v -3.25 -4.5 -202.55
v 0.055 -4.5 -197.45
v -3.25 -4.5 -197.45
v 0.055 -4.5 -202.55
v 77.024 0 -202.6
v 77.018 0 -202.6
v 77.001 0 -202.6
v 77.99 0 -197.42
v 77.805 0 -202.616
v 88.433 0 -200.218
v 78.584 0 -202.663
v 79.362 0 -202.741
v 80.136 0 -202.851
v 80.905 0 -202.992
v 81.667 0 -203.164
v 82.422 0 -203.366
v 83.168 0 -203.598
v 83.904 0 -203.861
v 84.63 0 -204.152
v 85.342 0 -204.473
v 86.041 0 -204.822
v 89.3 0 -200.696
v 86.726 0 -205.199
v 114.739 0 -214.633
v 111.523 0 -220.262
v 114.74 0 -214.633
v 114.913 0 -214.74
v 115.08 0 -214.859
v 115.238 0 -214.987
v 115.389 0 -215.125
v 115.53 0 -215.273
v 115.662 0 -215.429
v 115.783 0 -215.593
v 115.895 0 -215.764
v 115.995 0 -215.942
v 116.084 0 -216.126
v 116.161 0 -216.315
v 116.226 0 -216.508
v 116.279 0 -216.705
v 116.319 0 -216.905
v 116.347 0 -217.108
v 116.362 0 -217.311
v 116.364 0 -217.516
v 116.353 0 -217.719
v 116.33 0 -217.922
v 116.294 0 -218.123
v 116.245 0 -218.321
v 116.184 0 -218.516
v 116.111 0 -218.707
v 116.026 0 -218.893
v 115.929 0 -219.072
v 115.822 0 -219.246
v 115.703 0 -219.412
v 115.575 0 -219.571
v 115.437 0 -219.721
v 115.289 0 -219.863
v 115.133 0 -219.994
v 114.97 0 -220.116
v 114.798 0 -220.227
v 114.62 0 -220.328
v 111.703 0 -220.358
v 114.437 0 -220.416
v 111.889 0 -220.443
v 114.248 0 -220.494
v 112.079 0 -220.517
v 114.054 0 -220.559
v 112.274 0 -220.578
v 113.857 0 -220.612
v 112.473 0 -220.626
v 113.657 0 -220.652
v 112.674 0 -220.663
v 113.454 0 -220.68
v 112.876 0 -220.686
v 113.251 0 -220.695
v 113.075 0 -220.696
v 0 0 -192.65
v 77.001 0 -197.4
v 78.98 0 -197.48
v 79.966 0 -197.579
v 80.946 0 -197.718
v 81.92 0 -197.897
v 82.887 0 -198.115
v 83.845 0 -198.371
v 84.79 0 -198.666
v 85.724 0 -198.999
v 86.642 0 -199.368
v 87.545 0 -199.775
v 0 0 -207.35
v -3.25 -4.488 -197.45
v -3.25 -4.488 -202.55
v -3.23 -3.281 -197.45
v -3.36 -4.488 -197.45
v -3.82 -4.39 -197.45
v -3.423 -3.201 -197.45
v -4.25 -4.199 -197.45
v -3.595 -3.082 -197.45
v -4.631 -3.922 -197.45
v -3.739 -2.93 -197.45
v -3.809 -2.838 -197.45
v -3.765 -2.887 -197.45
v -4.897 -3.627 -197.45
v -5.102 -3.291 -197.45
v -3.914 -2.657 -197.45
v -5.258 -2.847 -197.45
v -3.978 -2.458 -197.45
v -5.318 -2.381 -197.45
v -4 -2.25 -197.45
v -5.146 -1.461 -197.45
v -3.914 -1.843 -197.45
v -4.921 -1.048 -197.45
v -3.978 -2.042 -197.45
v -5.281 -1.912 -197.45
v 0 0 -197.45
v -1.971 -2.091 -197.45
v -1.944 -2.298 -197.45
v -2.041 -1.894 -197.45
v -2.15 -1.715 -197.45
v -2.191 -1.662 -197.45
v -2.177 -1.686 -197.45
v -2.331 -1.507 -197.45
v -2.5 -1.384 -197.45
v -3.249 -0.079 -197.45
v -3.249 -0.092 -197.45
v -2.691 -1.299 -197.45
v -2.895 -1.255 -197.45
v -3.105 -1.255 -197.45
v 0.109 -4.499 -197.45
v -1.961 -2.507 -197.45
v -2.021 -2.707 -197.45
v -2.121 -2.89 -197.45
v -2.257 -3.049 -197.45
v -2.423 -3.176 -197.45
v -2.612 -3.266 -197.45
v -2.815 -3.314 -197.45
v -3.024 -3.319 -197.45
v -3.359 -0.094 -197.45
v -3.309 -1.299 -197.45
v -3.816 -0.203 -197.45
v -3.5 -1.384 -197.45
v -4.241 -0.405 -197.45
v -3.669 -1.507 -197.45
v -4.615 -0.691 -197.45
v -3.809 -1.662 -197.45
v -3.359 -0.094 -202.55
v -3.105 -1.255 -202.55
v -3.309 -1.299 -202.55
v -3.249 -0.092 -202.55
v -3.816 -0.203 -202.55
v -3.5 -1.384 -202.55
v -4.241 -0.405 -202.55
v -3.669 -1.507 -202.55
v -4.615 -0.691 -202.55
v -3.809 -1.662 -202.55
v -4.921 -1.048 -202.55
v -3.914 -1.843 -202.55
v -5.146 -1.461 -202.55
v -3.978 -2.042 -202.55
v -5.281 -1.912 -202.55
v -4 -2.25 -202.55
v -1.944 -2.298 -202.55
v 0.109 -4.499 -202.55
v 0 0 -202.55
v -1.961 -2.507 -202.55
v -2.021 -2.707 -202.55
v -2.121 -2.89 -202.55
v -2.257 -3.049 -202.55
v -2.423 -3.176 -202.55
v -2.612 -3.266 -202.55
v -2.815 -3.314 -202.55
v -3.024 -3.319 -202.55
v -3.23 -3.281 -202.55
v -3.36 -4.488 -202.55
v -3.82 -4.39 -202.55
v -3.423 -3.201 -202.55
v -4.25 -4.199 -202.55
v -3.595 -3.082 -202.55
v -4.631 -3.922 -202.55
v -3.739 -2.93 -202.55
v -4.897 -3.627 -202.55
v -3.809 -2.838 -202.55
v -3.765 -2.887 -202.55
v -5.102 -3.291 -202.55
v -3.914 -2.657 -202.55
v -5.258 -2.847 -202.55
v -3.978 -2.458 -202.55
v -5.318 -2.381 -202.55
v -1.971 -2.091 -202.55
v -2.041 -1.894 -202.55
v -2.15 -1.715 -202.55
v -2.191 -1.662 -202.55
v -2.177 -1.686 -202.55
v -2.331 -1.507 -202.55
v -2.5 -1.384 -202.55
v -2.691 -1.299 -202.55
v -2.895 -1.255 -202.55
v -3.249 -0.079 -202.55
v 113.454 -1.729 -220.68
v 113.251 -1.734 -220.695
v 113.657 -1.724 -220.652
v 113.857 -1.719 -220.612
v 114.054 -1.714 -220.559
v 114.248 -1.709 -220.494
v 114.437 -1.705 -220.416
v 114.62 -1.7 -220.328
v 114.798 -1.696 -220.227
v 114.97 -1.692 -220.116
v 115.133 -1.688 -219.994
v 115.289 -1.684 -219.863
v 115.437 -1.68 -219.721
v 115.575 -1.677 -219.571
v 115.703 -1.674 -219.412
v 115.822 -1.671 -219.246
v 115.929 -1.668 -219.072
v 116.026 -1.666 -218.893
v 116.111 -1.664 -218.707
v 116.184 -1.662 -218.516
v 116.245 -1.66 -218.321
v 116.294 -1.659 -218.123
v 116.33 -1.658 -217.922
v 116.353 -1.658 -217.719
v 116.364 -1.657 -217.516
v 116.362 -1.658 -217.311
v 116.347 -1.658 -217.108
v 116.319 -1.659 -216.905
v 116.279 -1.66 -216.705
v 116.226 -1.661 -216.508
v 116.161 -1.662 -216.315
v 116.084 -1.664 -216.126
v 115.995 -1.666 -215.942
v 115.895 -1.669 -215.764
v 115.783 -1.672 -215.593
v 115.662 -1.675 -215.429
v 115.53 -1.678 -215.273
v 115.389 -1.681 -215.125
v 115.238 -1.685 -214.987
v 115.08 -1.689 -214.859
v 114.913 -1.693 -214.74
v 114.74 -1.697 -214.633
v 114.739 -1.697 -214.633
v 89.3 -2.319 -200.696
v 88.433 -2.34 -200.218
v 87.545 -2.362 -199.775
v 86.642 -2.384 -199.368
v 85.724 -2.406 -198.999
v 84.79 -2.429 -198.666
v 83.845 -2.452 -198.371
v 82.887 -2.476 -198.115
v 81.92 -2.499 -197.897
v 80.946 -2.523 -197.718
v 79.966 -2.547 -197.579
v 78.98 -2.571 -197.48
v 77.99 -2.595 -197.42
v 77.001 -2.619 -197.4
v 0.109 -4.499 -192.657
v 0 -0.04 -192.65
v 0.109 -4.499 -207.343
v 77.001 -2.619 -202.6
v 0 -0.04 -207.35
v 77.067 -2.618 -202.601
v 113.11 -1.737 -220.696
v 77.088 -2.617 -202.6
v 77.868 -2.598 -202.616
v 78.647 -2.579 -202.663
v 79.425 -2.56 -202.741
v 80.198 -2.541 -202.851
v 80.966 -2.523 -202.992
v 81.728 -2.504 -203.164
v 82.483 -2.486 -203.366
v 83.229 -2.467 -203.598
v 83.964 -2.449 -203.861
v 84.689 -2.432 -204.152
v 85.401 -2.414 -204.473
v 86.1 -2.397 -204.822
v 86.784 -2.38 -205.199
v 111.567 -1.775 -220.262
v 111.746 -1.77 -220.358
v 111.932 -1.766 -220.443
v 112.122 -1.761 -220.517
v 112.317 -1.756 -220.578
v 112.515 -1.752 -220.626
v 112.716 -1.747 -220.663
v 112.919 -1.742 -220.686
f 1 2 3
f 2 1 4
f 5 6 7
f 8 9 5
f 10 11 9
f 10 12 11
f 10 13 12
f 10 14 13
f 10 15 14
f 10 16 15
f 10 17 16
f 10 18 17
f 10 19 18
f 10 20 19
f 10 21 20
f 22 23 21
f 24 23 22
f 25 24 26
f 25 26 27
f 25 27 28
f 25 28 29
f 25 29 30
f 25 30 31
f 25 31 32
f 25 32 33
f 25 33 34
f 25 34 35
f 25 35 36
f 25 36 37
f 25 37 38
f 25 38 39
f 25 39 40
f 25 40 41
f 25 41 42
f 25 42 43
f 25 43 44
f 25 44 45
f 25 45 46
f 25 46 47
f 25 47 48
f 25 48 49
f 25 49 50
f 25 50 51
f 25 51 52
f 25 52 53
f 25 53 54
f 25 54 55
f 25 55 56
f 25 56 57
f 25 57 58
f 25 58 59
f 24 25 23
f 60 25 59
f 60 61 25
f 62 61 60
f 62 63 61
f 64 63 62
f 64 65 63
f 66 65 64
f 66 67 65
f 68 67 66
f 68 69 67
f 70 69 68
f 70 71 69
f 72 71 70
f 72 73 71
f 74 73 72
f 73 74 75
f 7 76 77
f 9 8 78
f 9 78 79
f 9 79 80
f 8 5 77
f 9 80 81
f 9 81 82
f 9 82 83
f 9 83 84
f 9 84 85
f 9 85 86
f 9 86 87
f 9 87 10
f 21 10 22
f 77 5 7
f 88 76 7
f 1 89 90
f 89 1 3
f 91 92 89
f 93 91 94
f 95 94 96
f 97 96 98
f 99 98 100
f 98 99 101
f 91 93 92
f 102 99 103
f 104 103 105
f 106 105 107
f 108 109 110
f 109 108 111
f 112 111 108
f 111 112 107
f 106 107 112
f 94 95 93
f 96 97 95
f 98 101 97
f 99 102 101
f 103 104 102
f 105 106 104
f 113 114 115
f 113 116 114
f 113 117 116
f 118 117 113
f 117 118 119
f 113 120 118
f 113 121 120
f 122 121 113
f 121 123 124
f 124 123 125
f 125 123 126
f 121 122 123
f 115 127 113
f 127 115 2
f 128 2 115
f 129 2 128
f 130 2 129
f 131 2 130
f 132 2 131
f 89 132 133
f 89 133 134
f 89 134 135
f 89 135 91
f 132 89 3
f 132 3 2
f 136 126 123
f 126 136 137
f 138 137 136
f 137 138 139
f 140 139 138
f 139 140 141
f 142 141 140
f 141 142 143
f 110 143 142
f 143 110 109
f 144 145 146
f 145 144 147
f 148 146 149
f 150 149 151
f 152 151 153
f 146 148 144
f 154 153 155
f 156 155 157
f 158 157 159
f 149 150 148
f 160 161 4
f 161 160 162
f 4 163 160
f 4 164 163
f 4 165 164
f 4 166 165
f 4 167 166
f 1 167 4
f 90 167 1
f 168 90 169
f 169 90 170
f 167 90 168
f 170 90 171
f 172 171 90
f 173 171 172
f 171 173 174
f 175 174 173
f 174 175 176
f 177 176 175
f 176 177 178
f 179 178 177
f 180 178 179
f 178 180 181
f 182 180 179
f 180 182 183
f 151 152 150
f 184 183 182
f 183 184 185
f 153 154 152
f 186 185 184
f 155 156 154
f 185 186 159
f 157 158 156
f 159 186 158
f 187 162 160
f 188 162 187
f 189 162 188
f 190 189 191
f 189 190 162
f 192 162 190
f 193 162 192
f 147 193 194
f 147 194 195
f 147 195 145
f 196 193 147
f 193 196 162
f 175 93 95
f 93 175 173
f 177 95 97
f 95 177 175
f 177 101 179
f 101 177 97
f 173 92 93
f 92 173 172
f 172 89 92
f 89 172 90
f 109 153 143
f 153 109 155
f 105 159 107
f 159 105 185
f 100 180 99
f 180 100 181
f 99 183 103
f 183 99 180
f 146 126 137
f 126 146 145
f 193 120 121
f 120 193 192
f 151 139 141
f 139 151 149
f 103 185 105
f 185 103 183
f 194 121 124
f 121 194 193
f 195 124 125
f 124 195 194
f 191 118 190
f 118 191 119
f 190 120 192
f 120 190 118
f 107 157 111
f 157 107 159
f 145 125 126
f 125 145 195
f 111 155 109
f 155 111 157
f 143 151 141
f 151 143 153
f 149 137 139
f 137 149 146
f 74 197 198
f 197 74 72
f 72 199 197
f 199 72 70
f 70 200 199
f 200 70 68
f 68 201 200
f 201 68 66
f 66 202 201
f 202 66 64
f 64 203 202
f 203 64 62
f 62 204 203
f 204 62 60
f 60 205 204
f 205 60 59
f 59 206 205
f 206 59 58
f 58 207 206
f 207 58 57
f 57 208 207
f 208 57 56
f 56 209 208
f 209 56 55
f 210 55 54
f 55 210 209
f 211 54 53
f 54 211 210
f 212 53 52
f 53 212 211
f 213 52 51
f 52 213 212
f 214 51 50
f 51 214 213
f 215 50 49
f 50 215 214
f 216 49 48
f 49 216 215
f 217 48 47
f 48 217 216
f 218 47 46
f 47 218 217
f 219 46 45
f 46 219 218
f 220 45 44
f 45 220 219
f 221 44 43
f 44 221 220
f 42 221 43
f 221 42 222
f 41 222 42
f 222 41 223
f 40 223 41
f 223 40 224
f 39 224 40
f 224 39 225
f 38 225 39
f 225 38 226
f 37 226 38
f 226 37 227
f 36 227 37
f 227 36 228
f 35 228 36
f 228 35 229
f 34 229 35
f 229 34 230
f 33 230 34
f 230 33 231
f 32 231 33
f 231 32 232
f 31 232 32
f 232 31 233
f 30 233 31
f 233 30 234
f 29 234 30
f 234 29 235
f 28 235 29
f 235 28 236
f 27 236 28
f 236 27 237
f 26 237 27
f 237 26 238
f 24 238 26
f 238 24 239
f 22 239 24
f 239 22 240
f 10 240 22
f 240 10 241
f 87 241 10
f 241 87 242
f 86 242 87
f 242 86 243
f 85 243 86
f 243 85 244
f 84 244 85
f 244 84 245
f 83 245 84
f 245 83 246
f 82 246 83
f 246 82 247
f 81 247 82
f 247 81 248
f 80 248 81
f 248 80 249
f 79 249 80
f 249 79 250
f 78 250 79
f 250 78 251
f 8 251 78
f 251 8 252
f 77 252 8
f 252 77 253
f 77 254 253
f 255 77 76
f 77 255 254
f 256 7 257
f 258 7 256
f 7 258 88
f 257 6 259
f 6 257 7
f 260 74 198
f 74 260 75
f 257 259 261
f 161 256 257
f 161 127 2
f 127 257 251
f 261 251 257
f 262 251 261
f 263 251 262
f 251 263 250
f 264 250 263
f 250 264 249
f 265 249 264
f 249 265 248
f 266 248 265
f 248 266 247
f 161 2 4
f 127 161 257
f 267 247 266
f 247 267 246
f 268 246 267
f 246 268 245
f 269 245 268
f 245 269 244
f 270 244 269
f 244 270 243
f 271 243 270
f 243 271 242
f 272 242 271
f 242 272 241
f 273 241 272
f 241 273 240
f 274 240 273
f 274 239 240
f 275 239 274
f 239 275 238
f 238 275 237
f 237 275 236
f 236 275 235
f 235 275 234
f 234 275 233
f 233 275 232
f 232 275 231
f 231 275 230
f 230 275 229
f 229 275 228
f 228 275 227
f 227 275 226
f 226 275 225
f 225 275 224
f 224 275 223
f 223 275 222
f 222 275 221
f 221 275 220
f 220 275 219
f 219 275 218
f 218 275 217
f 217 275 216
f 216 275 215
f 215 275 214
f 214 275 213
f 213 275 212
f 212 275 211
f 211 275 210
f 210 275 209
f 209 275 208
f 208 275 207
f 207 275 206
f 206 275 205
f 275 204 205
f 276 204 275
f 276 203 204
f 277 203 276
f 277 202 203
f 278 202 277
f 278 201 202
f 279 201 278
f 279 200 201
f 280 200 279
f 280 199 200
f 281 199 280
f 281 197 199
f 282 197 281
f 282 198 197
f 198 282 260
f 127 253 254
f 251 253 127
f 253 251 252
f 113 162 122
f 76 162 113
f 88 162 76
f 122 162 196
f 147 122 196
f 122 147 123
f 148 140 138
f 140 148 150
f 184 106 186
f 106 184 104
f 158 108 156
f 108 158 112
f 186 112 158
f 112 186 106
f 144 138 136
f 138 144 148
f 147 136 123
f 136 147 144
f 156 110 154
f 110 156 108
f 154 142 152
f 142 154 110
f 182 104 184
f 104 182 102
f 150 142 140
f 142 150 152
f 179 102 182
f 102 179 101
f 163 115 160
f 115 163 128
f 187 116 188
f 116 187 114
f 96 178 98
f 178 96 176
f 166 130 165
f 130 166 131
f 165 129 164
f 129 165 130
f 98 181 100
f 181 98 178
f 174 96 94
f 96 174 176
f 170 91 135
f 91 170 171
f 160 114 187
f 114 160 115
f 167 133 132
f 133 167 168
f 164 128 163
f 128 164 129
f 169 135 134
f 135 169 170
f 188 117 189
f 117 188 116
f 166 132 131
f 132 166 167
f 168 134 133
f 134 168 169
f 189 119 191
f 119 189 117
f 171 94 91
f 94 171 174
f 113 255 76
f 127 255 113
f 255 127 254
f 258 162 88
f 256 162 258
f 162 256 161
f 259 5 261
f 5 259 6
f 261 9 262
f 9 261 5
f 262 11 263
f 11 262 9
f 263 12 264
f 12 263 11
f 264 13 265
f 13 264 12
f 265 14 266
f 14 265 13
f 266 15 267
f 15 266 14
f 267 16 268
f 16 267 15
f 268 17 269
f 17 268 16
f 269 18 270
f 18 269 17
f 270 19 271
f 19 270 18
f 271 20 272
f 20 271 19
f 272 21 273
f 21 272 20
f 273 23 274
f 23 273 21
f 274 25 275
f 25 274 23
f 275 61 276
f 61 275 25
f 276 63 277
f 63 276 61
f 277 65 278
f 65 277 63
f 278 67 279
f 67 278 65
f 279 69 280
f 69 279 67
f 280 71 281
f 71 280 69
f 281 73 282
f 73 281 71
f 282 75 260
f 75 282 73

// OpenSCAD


/* [Temples (Arms)] */
//Height of the temple
Temple_Height = 14.2;		//[8:0.1:20]
//Width of the temple
Temple_Width = 4.5;		//[2:0.1:10]
//Amount of taper
Temple_Taper = 1.4;	//[0:0.1:3]
//If curving, enable this after you have set all of the other options because Thingiverse displays the model very small.
Curved_Temple = "No"; //[Yes,No]
//Amount of curve
Temple_Curve = 35;	//[0:100]


/* [Hinge] */
//Hinge height
Hinge_Height = 5.6;	//[2:0.1:16]
//Hinge screw hole radius
Screw_Radius = 1.0;			//[0.1:0.1:2]
//Hinge temple offset spacer
Hinge_Spacer = 5;			//[1:0.1:10]
//Gap tolerance
Tolerance = 0.5; 			//[0:0.1:1]

/* [Ear Bend] */
//Temple length to ear curve
Temple_Length1 = 77;  //[50:100]
//Ear Bend Radius
Ear_Radius = 22;		//[10:40]
//Ear Bend Radius
Ear_Radius2 = 14;		//[5:40]
// Temple end length
Temple_Length2 = 29;	//[10:40]
//Ear bend angle
Temple_Angle = 30;	//[10:45]

/* [Hidden] */

$fn = 100; 

temple_h1 = Temple_Height+.5; // Arm height adjustment
temple_h2 = Temple_Height-9;	// Ear bend height adjustment
temple_h3 = Temple_Height-7.7;	// Arm end height adjustment



eps = 1e-3;


translate([0, 0, -200])
rotate(90, [1,0,0])
intersection() {
	rotate(Temple_Taper, [0,1,0])
	temple();
	temple();
}

$t = 50;




module temple() {

	if (Curved_Temple == "Yes") {
		translate([0, 20, 0]) 
		rotate(-90, [0,0,1])
		parabolic_bend([400, 500, Temple_Width*1.5], (Temple_Curve * .0001))
		translate([20, 0, 0]) 
		rotate(90, [0,0,1])
			linear_extrude(height=Temple_Width) _temple();
	}else{
		linear_extrude(height=Temple_Width) _temple();
	}

		translate([-(Hinge_Spacer+1)/2, 0, (Temple_Width+2)/2])
			difference() {
                                union() {
												// hinge body
                                    translate([(Temple_Width)/2,0,-1])
												//cube([Hinge_Spacer+1-(Temple_Width+2)/2, Hinge_Height-0.5, Temple_Width+2], center=true);
                                    cube([Hinge_Spacer, Hinge_Height-Tolerance, Temple_Width], center=true);
                                    // curved hinge edge
												translate([-((Temple_Width)/4)+1, 0, -1]) rotate([90,0,0])
                                    cylinder(r=(Temple_Width)/2, h=Hinge_Height-Tolerance, center=true, $fn=30);
                                }
				// screw hole
				translate([0, 0, -1])
				rotate([90, 0, 0]) cylinder(r=Screw_Radius, h=Hinge_Height+0.5, center=true, $fn=30); 
			}
}


module _temple() {
	hull() {
		// main body
		square([eps, temple_h1], center=true); 
		translate([Temple_Length1+eps, 0]) square([eps,temple_h2], center=true);
		
	}
	// ear curve
	translate([Temple_Length1, 0]) for (i=[0:Ear_Radius2-1]) hull() {
		translate([sin(Temple_Angle*i/(Ear_Radius2-1))*Ear_Radius, -(1-cos(Temple_Angle*i/(Ear_Radius2-1)))*Ear_Radius]) 
			rotate(-Temple_Angle*i/(Ear_Radius2-1)) 
				square([eps, temple_h2], center=true);
		
		translate([sin(Temple_Angle*(i+1)/(Ear_Radius2-1))*Ear_Radius, -(1-cos(Temple_Angle*(i+1)/(Ear_Radius2-1)))*Ear_Radius]) 
			rotate(-Temple_Angle*(i+1)/(Ear_Radius2-1)) 
				square([eps, temple_h2], center=true);
	}
	//tail piece
	translate([Temple_Length1+sin(Temple_Angle)*Ear_Radius, -(1-cos(Temple_Angle))*Ear_Radius])
		rotate(-Temple_Angle) hull() {
			square([eps, temple_h2], center=true);
			translate([Temple_Length2, 0]) square([eps,temple_h3], center=true);
 		translate([Temple_Length2, 0]) circle(temple_h3/2);
		}
}



// Bend flat object on parabole
// dimensions: vector with dimensions of the object that should be bent
// steepness:  coeficient 'a' of the function 'y = a * x^2'
// nsteps:     number of parts the object will be split into before being bent 
module parabolic_bend(dimensions, steepness, nsteps = $fn) {
	function curr_z(step, ysw) = steepness * pow(step * ysw, 2);
	function flat_width(step, ysw) = 
		ysw * sqrt(pow(2 * steepness * step * ysw, 2) + 1);
	function acc_y(step, ysw) =
		step == 0 ? ysw / 2 : acc_y(step - 1, ysw) + flat_width(step, ysw);

	assign(max_y = dimensions.y / sqrt(1 + steepness))
	assign(ysw = nsteps == 0 ? tan($fa) / (2 * steepness) : max_y / nsteps)
	assign(steps = nsteps == 0 ? max_y / ysw : nsteps)
	{
		intersection() {
			children(0);
			cube([dimensions.x, ysw/2, dimensions.z]);
		}      		

		for (step = [1:ceil(steps)]) {
			assign(curr_flat = flat_width(step, ysw))
			assign(acc_flat = acc_y(step - 1, ysw))
			assign(angle = atan(2 * steepness * step * ysw))
			{
				translate([0, step * ysw, curr_z(step, ysw)])
   				rotate(angle, [1, 0, 0])
						translate([0, -acc_flat - curr_flat/2, 0])
							intersection() {
								children(0);
								translate([0, acc_flat, 0])
									cube([dimensions.x, curr_flat, dimensions.z]);
							}
			}
		}
	}
}


